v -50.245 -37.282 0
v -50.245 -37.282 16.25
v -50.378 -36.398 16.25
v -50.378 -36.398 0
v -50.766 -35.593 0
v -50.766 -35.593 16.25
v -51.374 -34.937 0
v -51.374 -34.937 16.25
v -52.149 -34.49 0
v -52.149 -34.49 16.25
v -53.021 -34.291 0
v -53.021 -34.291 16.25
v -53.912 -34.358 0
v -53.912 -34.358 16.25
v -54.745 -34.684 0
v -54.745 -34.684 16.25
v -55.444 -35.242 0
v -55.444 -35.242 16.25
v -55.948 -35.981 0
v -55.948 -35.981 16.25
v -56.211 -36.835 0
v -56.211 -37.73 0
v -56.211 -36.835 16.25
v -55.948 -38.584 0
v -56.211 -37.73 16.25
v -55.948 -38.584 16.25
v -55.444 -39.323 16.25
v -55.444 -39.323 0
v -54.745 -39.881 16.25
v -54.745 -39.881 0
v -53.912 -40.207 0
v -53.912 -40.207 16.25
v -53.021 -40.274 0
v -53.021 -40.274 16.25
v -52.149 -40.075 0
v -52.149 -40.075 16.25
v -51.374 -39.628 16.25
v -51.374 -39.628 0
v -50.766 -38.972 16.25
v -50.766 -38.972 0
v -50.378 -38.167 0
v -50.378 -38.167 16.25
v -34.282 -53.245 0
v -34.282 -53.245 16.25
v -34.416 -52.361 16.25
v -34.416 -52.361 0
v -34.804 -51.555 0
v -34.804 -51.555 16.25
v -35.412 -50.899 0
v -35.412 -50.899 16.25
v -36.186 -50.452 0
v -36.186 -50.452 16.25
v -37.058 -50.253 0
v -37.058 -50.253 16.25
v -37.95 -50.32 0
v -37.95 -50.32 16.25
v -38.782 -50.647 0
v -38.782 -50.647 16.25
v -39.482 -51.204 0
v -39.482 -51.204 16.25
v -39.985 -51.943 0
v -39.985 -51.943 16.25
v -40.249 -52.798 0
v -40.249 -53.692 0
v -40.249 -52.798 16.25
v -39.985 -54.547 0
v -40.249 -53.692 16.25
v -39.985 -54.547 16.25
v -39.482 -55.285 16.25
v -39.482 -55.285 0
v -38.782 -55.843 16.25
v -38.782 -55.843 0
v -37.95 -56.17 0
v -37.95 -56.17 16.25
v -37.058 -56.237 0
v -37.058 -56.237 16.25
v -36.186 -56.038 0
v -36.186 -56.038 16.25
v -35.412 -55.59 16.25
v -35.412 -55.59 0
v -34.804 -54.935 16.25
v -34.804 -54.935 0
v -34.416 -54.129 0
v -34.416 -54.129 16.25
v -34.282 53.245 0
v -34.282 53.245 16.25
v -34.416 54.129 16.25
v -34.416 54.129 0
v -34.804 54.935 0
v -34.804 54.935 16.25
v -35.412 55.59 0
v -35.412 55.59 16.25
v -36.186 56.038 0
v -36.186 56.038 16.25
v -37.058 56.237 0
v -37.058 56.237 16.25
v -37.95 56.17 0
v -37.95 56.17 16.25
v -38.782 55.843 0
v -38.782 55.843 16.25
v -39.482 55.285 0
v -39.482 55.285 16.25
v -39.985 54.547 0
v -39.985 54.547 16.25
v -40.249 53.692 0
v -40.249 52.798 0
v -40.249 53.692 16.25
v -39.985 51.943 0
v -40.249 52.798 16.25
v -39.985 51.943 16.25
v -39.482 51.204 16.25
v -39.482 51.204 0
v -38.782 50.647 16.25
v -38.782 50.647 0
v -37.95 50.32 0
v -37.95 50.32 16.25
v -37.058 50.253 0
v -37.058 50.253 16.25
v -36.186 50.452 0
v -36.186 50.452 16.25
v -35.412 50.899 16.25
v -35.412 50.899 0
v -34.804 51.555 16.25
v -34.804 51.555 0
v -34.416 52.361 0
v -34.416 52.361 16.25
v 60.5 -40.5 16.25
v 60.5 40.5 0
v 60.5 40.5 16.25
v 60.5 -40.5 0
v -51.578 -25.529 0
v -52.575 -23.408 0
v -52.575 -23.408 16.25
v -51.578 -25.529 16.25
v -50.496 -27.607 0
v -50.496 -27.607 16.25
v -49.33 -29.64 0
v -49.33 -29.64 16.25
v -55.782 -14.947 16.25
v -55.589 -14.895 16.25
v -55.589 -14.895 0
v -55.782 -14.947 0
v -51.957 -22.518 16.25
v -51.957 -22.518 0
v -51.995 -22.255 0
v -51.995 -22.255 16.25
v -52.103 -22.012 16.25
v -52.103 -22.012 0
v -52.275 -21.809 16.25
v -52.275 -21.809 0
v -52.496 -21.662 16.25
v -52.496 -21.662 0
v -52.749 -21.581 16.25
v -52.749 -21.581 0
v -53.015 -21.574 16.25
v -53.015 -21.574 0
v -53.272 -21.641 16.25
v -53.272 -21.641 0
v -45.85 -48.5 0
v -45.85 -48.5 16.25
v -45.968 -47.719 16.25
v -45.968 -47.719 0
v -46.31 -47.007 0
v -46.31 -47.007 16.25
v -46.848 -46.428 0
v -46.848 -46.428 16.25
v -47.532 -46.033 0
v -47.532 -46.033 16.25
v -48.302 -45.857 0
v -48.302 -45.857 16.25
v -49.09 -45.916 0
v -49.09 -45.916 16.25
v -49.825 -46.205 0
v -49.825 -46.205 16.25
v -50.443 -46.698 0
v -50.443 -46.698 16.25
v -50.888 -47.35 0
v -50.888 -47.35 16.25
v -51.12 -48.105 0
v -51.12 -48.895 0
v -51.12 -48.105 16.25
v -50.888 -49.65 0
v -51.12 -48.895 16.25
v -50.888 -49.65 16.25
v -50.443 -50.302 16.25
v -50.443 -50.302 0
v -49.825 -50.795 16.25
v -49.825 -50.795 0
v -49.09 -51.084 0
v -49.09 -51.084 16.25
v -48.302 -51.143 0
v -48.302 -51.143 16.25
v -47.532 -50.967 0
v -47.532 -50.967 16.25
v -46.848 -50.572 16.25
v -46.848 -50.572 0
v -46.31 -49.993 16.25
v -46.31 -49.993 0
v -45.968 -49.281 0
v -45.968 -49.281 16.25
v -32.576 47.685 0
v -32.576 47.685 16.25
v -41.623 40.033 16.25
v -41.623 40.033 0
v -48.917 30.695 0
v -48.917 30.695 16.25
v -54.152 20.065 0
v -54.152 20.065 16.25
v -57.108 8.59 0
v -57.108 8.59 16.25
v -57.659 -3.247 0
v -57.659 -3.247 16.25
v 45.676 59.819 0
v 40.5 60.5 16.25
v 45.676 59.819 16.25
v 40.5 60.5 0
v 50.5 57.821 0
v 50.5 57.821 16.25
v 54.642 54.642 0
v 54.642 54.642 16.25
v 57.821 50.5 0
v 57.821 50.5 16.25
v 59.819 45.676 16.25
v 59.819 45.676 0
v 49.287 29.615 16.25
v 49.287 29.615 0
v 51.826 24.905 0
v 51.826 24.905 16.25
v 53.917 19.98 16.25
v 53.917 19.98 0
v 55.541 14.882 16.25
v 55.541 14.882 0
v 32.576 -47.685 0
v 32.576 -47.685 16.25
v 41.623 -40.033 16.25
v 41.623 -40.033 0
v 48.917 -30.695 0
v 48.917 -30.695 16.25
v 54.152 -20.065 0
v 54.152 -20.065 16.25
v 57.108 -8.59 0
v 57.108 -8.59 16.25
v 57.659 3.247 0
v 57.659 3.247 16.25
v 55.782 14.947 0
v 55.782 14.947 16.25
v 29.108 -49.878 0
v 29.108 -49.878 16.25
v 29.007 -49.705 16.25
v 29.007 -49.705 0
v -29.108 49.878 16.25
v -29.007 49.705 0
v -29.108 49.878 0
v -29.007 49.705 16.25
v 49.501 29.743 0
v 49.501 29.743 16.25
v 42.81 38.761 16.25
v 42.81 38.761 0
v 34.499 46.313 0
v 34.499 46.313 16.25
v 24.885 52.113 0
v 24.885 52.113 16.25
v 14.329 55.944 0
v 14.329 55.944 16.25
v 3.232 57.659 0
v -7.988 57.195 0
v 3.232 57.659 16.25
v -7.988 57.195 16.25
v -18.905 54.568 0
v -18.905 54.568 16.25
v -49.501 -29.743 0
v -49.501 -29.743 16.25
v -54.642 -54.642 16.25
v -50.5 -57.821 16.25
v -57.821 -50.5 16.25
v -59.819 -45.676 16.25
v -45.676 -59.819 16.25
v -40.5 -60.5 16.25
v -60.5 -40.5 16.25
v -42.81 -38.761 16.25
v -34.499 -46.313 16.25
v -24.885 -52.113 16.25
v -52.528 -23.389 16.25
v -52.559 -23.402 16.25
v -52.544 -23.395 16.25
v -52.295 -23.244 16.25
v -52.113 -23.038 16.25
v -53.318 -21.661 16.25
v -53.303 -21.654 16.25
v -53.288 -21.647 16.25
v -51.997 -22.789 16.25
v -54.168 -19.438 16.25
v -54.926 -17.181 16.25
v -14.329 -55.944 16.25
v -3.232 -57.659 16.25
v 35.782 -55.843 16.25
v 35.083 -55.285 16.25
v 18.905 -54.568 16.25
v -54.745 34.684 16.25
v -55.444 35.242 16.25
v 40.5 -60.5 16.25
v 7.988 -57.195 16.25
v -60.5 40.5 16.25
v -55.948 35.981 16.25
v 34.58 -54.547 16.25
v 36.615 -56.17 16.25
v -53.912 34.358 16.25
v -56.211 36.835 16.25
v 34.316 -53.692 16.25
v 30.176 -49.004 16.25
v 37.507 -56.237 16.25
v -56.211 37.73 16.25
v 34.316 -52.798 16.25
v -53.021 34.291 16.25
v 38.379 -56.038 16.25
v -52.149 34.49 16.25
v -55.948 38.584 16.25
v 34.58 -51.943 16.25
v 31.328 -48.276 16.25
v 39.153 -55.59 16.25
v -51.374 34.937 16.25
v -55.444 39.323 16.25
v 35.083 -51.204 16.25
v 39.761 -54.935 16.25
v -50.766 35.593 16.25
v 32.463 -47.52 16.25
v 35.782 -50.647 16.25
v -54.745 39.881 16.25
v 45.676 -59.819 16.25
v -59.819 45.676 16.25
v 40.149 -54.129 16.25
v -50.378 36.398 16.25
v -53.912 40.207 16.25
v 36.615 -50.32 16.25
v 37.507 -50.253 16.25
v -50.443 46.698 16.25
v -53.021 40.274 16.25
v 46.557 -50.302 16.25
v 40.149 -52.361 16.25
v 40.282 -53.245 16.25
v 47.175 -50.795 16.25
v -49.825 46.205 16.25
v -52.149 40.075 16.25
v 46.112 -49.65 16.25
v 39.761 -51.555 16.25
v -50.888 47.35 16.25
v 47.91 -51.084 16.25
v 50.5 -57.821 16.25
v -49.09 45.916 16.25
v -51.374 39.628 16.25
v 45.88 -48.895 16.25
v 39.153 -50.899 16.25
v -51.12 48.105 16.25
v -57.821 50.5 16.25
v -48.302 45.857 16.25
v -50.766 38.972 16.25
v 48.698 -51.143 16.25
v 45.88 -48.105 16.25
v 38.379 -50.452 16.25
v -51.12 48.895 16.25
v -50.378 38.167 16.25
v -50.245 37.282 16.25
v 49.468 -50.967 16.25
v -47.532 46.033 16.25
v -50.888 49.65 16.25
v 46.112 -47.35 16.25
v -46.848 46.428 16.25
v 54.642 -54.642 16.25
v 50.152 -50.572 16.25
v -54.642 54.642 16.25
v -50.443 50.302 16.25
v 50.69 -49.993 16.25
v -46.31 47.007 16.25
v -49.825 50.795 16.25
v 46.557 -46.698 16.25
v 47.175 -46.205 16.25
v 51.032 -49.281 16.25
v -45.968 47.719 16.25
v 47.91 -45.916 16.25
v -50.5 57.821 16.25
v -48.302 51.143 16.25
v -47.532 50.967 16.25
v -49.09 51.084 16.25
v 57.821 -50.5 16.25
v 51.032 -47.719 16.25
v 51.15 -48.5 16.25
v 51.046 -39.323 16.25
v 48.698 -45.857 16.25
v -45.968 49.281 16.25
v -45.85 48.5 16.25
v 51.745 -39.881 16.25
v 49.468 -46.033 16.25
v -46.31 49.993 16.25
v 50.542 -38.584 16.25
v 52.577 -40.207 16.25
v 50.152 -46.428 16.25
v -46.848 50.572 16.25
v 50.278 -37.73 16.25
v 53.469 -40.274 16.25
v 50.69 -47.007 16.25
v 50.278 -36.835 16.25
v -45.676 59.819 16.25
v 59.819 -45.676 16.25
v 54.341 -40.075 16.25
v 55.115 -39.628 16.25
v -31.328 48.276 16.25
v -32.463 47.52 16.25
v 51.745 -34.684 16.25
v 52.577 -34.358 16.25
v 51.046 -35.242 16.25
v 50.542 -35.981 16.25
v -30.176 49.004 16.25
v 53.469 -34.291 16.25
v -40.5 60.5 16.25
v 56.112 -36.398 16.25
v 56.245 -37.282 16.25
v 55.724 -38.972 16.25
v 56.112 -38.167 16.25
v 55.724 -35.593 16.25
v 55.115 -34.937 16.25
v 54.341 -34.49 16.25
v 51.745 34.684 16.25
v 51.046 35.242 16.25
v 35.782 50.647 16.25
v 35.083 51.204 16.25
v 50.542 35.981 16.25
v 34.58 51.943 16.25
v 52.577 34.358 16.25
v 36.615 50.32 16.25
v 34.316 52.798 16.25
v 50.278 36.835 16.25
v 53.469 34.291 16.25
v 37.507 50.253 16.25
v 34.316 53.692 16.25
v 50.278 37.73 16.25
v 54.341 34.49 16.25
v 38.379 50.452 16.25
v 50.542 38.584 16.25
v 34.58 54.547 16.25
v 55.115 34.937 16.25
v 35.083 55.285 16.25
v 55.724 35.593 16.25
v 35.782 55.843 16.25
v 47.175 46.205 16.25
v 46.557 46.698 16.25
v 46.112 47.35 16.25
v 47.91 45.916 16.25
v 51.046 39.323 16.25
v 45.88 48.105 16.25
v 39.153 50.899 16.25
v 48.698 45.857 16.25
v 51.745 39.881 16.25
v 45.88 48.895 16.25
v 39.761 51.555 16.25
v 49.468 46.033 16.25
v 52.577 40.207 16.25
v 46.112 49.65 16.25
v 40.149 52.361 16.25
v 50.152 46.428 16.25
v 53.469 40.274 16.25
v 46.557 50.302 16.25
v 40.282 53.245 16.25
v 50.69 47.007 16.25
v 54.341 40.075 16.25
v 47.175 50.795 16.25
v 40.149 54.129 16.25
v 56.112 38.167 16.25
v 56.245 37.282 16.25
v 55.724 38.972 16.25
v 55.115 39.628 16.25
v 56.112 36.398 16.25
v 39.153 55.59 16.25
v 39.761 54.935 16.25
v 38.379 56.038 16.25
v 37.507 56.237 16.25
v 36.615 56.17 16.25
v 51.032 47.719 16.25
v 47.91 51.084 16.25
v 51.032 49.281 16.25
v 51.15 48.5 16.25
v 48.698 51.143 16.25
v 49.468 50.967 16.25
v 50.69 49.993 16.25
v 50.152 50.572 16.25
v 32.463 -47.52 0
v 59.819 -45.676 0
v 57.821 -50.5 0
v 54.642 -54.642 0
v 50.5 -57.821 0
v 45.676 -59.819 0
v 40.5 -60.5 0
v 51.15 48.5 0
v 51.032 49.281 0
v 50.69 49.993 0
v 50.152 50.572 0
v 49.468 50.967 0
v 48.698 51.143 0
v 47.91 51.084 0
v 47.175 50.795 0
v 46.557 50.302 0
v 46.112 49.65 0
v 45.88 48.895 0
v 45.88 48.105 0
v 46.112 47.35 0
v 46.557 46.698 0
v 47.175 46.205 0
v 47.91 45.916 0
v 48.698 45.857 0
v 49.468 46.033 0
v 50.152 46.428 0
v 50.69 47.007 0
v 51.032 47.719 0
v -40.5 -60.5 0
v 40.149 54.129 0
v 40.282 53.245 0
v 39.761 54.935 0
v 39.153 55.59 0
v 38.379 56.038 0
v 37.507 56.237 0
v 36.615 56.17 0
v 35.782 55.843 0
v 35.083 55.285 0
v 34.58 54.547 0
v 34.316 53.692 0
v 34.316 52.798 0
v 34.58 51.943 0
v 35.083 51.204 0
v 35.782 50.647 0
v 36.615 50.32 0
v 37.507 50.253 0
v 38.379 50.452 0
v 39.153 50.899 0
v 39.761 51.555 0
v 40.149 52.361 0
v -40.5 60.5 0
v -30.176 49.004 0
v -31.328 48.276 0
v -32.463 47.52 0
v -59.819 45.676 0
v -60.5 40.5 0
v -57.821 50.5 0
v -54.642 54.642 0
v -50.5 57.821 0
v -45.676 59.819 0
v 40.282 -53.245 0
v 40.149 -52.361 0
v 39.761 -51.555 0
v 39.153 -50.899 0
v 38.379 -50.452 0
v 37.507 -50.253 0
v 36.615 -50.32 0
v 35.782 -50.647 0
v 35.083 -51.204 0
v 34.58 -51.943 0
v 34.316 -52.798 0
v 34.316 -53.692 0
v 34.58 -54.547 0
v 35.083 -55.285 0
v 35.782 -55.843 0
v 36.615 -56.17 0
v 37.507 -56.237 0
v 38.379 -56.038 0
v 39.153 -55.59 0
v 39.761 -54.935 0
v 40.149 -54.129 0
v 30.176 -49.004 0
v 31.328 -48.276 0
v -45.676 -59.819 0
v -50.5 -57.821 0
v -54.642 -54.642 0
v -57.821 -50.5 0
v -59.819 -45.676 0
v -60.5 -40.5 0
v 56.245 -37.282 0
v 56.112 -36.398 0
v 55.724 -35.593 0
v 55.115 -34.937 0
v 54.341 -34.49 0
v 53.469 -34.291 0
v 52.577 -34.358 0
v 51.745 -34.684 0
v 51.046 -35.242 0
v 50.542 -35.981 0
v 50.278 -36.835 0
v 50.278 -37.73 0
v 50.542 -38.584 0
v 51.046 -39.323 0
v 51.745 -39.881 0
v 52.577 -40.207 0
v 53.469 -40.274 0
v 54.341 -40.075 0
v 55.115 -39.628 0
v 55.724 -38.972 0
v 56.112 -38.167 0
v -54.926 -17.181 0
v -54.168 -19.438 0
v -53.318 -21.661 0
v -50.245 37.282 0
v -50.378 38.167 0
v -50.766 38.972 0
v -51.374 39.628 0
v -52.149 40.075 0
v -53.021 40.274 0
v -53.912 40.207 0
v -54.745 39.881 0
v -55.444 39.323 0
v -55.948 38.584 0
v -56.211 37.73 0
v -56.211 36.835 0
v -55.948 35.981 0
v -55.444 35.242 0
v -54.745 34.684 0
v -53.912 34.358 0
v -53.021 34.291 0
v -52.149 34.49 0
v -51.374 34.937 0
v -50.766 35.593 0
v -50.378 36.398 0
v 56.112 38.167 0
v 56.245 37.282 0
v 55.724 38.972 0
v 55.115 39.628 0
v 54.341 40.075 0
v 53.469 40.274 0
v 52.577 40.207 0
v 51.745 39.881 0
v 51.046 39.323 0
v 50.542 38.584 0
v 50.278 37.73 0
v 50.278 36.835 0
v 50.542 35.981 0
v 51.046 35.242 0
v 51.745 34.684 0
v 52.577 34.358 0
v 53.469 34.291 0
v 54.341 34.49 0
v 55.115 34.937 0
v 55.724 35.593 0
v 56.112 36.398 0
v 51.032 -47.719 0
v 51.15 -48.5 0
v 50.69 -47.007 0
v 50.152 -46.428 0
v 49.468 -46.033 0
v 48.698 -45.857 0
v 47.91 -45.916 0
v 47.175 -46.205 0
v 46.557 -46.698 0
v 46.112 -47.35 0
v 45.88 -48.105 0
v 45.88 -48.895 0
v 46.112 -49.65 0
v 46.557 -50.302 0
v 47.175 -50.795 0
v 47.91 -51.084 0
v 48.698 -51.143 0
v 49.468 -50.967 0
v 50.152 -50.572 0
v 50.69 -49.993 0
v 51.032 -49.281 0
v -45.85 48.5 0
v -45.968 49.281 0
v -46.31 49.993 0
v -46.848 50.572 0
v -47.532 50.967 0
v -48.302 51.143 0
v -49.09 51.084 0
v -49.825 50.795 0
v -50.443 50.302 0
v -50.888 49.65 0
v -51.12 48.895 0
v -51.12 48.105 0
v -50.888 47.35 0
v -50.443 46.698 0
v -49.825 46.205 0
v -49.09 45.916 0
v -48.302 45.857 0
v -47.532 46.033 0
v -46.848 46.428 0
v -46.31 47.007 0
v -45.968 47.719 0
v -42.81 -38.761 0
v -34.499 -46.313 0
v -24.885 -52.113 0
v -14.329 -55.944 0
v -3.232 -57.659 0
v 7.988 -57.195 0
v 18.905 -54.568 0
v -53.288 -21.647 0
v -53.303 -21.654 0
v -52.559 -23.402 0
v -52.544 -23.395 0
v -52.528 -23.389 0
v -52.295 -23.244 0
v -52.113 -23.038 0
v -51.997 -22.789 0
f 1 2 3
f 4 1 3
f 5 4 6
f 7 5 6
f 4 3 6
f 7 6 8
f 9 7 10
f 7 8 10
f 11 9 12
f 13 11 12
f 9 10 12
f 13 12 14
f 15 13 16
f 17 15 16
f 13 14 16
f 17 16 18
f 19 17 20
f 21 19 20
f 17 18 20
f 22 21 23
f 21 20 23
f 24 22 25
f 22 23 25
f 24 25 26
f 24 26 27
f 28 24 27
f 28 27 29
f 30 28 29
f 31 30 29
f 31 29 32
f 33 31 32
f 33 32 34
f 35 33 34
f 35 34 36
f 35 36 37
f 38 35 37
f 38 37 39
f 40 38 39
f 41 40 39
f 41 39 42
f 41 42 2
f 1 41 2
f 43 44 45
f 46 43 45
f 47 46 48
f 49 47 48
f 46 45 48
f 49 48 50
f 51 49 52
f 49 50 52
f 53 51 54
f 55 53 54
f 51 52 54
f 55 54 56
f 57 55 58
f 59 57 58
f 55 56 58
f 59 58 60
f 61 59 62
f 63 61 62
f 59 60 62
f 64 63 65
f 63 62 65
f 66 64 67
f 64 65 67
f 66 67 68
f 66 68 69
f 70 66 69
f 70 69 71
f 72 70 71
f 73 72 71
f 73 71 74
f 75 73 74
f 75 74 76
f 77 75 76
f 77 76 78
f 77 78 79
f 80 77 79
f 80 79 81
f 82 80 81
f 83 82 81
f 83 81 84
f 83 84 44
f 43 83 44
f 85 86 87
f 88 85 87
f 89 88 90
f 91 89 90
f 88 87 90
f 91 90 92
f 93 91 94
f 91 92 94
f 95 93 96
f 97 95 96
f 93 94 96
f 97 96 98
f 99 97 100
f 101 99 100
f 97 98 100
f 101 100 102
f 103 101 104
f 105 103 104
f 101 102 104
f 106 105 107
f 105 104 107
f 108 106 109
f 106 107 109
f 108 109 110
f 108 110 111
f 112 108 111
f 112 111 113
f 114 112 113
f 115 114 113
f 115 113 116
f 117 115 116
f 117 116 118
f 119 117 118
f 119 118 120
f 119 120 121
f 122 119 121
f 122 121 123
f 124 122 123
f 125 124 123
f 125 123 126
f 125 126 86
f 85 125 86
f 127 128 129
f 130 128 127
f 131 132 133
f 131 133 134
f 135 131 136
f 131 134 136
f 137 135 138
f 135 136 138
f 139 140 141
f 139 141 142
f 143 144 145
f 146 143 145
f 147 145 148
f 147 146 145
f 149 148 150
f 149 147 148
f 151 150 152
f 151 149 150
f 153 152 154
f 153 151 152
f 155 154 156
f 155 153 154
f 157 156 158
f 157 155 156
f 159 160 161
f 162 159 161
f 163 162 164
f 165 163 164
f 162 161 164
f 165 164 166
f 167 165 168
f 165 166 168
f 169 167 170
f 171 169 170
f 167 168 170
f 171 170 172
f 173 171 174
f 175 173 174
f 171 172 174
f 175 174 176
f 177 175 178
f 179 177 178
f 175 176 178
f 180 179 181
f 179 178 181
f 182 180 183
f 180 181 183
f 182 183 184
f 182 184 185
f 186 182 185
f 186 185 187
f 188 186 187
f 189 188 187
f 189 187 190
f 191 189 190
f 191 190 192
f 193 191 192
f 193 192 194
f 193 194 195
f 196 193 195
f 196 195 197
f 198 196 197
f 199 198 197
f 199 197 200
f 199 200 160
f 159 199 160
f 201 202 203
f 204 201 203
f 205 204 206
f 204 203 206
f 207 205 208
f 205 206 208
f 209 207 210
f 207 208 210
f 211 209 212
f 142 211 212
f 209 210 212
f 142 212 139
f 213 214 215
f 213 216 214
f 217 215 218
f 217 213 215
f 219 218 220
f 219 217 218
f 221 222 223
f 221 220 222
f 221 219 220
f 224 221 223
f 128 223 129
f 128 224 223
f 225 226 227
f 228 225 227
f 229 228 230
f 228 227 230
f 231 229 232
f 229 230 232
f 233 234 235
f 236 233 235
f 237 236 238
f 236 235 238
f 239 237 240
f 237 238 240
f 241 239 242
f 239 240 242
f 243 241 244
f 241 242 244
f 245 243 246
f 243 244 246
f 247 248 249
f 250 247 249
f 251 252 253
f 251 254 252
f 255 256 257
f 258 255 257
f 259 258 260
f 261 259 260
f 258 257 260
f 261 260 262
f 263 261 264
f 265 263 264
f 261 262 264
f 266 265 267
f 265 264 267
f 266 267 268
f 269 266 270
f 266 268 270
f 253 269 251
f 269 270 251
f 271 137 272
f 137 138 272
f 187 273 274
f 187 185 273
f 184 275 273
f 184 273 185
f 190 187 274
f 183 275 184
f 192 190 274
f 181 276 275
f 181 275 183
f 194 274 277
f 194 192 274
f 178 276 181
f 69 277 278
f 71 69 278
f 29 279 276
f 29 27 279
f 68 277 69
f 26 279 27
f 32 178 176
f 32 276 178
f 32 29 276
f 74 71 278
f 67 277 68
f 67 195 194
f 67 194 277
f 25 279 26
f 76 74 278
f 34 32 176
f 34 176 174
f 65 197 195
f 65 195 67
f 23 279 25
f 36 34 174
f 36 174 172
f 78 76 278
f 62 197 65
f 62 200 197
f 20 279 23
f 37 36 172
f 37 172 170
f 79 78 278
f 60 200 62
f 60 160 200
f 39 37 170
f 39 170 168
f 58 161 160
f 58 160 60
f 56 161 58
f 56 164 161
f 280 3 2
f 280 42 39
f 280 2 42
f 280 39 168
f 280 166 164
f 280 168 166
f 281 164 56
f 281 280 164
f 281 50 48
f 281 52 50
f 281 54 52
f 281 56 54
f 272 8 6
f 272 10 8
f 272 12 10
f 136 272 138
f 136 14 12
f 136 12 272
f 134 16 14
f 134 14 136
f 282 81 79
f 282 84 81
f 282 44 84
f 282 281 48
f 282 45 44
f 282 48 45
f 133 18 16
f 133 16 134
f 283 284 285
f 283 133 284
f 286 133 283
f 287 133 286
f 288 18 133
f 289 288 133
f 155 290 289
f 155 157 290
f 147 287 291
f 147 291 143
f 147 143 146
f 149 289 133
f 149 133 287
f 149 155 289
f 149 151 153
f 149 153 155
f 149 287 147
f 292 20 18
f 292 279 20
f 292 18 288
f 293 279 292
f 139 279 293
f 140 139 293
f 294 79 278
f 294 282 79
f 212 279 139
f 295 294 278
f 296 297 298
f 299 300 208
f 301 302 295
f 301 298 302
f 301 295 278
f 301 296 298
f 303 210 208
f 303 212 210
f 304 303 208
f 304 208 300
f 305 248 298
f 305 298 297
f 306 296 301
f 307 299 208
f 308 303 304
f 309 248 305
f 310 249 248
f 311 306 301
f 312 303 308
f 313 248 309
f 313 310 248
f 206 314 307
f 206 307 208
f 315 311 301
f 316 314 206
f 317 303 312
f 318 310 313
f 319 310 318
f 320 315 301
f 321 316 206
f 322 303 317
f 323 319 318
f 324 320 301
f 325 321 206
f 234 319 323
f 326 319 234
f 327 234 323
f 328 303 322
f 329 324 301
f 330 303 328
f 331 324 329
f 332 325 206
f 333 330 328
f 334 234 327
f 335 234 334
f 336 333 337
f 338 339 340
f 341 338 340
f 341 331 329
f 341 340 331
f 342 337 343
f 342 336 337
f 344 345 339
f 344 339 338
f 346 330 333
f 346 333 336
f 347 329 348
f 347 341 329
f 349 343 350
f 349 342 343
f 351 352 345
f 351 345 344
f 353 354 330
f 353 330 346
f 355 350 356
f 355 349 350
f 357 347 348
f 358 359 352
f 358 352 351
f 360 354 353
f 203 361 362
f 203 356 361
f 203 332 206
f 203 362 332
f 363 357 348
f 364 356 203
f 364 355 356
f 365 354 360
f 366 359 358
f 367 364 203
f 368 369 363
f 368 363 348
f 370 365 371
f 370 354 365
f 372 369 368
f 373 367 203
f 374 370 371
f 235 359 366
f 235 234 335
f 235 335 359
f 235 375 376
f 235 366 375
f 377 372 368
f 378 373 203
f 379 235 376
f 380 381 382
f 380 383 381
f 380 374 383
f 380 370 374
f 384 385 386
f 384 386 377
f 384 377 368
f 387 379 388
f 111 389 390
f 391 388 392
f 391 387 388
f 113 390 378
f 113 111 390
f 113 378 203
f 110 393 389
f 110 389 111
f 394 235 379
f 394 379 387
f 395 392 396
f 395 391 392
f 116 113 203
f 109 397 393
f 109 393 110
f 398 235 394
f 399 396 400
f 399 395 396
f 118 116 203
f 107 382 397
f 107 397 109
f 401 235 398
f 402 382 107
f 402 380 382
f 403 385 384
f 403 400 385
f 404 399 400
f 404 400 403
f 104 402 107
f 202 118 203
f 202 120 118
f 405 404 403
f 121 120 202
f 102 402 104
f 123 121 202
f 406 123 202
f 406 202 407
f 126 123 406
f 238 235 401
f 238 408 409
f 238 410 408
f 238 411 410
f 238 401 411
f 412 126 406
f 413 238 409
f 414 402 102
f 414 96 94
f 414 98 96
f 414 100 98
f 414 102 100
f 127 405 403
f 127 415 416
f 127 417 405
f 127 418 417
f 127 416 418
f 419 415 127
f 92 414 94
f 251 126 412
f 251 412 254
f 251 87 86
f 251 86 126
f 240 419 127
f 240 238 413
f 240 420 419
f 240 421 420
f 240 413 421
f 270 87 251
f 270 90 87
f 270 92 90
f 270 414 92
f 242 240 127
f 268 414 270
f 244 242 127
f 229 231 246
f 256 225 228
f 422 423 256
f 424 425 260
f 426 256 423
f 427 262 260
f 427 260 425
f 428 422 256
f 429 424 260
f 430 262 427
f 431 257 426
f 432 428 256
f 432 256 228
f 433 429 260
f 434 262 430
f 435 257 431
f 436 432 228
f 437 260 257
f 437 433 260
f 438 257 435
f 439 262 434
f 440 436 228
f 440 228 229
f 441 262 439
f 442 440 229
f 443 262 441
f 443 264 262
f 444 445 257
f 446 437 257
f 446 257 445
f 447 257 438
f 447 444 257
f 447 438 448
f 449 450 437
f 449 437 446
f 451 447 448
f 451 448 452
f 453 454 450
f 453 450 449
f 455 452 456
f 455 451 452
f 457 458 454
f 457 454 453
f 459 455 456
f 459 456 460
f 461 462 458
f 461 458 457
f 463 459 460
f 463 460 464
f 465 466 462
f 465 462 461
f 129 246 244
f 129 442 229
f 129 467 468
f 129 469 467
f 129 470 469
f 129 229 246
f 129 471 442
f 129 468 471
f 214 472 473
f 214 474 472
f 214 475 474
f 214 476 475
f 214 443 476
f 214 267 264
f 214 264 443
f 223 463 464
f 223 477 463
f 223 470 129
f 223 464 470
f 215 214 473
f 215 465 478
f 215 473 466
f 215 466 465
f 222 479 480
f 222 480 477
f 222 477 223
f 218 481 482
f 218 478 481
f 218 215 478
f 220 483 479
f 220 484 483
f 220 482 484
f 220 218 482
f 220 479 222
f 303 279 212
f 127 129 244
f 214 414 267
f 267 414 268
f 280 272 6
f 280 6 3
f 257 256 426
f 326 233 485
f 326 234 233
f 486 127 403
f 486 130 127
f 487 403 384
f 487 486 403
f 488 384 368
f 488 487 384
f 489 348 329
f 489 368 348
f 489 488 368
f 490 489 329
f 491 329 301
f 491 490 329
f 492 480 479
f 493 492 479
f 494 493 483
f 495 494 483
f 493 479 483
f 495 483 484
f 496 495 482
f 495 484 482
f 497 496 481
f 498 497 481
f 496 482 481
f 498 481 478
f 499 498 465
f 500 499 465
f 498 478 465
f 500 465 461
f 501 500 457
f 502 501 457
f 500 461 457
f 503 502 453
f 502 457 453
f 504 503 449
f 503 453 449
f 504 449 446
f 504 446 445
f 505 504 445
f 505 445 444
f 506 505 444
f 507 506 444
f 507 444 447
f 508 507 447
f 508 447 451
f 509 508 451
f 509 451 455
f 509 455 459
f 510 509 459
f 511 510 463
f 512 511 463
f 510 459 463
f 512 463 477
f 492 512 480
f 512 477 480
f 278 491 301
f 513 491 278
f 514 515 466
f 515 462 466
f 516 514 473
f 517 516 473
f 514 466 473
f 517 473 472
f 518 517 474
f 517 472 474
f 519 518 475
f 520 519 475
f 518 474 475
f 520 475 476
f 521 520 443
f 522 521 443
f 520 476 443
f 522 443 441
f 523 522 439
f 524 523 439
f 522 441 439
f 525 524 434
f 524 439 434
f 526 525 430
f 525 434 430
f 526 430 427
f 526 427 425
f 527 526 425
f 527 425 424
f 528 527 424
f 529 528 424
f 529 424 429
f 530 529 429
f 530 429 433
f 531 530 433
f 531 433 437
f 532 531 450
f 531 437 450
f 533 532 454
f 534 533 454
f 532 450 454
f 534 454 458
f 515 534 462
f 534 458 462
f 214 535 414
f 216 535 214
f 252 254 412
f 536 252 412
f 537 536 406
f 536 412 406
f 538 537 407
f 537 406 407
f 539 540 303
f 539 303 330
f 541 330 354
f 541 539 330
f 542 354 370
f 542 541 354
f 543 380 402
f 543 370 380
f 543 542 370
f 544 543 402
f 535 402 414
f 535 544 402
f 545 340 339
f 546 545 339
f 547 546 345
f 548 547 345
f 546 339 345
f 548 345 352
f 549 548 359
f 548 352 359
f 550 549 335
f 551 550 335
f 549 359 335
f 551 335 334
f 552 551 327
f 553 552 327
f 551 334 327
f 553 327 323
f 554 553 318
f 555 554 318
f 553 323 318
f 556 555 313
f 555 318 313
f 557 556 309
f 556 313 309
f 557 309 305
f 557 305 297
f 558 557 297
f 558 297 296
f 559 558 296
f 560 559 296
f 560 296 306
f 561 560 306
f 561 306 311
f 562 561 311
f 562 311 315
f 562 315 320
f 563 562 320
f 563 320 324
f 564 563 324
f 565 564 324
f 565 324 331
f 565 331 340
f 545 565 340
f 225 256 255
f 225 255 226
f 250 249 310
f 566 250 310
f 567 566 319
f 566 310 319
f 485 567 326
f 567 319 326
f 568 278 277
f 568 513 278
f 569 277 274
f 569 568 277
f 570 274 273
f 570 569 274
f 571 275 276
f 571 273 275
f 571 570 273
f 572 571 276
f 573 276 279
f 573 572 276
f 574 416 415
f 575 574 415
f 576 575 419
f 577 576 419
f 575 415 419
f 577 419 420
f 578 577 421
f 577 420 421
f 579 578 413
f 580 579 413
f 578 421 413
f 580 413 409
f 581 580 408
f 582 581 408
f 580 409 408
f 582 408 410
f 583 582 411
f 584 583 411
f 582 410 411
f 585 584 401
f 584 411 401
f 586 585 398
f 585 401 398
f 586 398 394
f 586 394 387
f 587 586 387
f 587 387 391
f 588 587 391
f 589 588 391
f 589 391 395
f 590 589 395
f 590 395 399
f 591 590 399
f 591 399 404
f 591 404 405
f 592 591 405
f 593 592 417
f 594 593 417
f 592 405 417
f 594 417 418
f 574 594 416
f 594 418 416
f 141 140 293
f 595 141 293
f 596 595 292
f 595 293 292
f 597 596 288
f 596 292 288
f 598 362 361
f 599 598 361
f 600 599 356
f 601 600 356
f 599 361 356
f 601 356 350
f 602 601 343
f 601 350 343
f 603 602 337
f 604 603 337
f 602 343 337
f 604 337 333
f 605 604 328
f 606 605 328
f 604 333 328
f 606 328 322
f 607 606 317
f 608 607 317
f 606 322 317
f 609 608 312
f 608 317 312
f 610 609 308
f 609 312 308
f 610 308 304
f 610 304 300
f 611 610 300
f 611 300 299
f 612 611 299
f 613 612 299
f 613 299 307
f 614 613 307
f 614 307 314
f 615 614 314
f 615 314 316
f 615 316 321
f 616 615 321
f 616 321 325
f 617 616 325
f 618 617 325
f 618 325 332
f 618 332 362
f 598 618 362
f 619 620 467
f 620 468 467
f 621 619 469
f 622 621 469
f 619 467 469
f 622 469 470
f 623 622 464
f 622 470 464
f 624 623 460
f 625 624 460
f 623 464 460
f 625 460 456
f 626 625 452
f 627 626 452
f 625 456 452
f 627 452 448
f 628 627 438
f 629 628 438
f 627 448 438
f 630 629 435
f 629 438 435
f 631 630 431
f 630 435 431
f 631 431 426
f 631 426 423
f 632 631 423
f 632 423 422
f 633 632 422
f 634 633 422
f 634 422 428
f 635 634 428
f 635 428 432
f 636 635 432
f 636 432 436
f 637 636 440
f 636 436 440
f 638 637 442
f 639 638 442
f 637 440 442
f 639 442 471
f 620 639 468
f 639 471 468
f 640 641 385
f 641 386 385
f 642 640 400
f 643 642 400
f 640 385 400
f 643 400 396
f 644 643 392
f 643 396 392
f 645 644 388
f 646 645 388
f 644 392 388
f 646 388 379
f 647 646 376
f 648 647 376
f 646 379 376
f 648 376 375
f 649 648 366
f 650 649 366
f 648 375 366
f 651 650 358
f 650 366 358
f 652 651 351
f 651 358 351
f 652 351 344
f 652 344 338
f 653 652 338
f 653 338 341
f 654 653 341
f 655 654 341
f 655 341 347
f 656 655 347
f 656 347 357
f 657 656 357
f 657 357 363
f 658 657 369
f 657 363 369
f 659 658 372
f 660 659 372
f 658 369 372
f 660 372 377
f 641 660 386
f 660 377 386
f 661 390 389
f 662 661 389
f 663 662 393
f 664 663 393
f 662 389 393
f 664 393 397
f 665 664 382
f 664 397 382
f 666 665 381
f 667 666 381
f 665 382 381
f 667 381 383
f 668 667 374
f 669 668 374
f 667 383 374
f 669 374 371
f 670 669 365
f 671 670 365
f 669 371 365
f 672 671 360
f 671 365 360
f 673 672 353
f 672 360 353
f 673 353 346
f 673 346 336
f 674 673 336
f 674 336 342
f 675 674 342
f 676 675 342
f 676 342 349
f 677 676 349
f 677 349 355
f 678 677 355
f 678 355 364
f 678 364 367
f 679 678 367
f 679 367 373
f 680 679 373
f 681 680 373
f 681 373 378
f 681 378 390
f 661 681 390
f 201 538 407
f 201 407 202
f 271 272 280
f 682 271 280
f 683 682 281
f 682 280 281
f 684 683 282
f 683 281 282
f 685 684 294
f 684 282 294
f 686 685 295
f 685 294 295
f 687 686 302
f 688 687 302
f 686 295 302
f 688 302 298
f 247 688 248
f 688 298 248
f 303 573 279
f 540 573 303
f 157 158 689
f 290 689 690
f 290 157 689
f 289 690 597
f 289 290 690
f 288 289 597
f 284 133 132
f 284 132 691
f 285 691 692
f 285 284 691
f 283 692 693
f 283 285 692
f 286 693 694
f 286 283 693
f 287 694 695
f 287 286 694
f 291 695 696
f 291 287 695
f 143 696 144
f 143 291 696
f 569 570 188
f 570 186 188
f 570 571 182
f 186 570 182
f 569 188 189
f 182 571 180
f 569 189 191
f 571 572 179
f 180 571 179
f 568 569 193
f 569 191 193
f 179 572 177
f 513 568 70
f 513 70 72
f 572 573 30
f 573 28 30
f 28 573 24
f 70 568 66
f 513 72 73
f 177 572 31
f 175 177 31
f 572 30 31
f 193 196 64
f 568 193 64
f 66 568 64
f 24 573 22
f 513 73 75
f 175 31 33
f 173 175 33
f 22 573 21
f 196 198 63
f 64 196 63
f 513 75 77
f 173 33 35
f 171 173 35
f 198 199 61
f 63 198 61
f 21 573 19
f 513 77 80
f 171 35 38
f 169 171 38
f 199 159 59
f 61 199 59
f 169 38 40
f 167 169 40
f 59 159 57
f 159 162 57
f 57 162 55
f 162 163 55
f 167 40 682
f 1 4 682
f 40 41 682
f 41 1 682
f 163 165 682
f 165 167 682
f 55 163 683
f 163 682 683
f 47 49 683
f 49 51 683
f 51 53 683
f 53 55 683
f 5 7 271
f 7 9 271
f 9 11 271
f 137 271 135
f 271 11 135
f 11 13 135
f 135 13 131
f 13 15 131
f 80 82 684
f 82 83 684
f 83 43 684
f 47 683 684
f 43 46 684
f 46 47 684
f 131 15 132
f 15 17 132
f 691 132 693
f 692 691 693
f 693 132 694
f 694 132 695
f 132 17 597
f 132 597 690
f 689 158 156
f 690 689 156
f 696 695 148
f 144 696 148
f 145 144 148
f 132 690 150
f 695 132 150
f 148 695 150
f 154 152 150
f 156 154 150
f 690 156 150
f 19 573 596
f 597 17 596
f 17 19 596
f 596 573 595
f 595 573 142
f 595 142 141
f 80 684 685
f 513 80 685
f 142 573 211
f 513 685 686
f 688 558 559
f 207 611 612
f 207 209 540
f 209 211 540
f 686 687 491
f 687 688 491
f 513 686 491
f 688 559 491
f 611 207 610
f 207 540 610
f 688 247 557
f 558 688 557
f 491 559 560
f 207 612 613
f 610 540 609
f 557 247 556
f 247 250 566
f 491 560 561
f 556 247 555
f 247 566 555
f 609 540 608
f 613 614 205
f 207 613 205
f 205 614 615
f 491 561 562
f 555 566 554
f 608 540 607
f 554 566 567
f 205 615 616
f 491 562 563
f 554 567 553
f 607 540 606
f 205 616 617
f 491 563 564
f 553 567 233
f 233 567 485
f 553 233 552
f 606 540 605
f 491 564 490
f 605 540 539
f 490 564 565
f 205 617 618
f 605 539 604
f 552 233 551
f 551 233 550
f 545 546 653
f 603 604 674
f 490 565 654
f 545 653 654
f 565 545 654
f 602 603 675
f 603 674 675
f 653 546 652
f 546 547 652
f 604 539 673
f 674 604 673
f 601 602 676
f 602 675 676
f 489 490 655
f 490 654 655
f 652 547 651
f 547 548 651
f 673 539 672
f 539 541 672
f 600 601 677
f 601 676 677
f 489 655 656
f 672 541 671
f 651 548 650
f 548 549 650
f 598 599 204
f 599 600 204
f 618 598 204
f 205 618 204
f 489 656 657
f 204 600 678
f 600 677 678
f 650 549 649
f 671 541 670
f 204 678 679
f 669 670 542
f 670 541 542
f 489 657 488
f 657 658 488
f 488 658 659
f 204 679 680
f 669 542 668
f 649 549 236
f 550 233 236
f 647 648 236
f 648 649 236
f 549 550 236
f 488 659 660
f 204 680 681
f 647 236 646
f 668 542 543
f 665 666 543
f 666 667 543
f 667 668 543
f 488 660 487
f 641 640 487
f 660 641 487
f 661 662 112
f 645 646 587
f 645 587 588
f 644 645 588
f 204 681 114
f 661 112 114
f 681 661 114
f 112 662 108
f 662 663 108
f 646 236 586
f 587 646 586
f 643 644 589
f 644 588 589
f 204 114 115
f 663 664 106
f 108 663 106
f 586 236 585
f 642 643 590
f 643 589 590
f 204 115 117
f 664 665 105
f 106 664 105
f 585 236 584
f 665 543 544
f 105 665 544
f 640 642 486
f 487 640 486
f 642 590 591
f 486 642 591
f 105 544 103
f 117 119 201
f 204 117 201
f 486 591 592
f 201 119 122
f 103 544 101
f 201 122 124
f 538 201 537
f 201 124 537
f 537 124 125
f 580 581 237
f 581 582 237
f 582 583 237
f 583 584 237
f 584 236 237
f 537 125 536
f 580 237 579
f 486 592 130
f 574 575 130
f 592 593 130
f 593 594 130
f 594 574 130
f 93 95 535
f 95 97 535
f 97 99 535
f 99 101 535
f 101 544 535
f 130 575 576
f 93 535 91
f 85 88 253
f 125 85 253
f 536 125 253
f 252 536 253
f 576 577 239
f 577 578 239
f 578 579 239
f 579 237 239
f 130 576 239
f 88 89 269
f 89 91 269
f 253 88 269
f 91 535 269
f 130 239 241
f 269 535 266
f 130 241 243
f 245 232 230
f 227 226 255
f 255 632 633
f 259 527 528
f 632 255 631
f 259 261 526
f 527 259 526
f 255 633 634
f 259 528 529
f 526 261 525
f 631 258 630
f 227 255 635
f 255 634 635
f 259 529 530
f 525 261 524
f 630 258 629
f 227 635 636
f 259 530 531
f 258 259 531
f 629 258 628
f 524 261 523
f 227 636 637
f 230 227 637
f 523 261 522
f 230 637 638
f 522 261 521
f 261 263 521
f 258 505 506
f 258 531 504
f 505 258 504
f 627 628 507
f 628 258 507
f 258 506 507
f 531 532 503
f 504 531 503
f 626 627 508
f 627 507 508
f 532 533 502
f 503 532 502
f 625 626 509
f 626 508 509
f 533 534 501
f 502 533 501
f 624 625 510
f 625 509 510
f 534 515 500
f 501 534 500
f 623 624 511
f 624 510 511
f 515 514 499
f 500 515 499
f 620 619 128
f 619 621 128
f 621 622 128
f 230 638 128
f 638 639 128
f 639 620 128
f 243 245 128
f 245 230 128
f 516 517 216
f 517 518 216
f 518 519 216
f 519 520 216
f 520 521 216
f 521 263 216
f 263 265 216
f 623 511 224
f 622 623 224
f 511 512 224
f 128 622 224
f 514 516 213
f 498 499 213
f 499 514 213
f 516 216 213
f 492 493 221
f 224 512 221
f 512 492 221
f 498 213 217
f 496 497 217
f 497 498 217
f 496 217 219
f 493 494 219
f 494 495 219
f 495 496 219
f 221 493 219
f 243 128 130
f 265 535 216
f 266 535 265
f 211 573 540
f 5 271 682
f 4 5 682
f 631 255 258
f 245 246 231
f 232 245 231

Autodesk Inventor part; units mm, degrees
ref_plane "YZ Plane" through (0, 0, 0) normal (1, 0, 0) x (0, 1, 0)
ref_plane "XZ Plane" through (0, 0, 0) normal (0, 1, 0) x (-1, 0, 0)
ref_plane "XY Plane" through (0, 0, 0) normal (0, 0, 1) x (1, 0, 0)
sketch "Sketch1" plane through (0, 0, 0) normal (0, 0, 1) x (1, 0, 0)
  circle A0 centre (0, 0) radius 57.5
  circle A1 centre (0, 0) radius 60.5
  line L0 (-40.5, 60.5) -> (40.5, 60.5)
  line L1 (60.5, 40.5) -> (60.5, -40.5)
  line L2 (40.5, -60.5) -> (-40.5, -60.5)
  line L3 (-60.5, -40.5) -> (-60.5, 40.5)
  arc A2 (-40.5, 60.5) -> (-60.5, 40.5) centre (-40.5, 40.5) ccw
  arc A3 (60.5, 40.5) -> (40.5, 60.5) centre (40.5, 40.5) ccw
  arc A4 (40.5, -60.5) -> (60.5, -40.5) centre (40.5, -40.5) ccw
  arc A5 (-60.5, -40.5) -> (-40.5, -60.5) centre (-40.5, -40.5) ccw
  dimension "d0" = 115
  dimension "d1" = 121
  dimension "d2" = 20
extrude "Extrusion1" add sketch "Sketch1" along normal blind 16.25
sketch "Sketch3" plane through (0, 0, 16.25) normal (0, 0, 1) x (1, 0, 0)
  circle A0 centre (-48.5, -48.5) radius 2.65 projected
  circle A1 centre (-53.2449, -37.2825) radius 2.15 projected
  circle A2 centre (-37.2825, -53.2449) radius 2.15 projected
  circle A3 centre (37.2825, -53.2449) radius 2.15 projected
  circle A4 centre (48.5, -48.5) radius 2.65 projected
  circle A5 centre (53.2449, -37.2825) radius 2.15 projected
  circle A6 centre (53.2449, 37.2825) radius 2.15 projected
  circle A7 centre (48.5, 48.5) radius 2.65 projected
  circle A8 centre (37.2825, 53.2449) radius 2.15 projected
  circle A9 centre (-37.2825, 53.2449) radius 2.15 projected
  circle A10 centre (-48.5, 48.5) radius 2.65 projected
  circle A11 centre (-53.2449, 37.2825) radius 2.15 projected
  point P0 (0, 0)
extrude "Extrusion3" cut sketch "Sketch3" against normal through all
sketch "Sketch4" plane through (0, 0, 16.25) normal (0, 0, 1) x (1, 0, 0)
  circle A0 centre (-37.2825, -53.2449) radius 2.15 projected
  circle A1 centre (-37.2825, -53.2449) radius 3
  circle A2 centre (-53.2449, -37.2825) radius 2.15 projected
  circle A3 centre (-53.2449, -37.2825) radius 3
  circle A4 centre (-53.2449, 37.2825) radius 2.15 projected
  circle A5 centre (-53.2449, 37.2825) radius 3
  circle A6 centre (-37.2825, 53.2449) radius 2.15 projected
  circle A7 centre (-37.2825, 53.2449) radius 3
  circle A8 centre (37.2825, 53.2449) radius 2.15 projected
  circle A9 centre (37.2825, 53.2449) radius 3
  circle A10 centre (53.2449, 37.2825) radius 2.15 projected
  circle A11 centre (53.2449, 37.2825) radius 3
  circle A12 centre (53.2449, -37.2825) radius 2.15 projected
  circle A13 centre (53.2449, -37.2825) radius 3
  circle A14 centre (37.2825, -53.2449) radius 2.15 projected
  circle A15 centre (37.2825, -53.2449) radius 3
  point P0 (0, 0)
  point P1 (48.5, -48.5)
  dimension "d28" = 6
  dimension "d29" = 6
  dimension "d30" = 6
  dimension "d31" = 6
  dimension "d32" = 6
  dimension "d33" = 6
  dimension "d34" = 6
  dimension "d36" = 6
extrude "Extrusion4" cut sketch "Sketch4" against normal through all contours A0 | A1 | A2 | A3 | A4 | A5 | A6 | A7 | A8 | A9 | A10 | A11 | A12 | A13 | A14 | A15
sketch "Sketch5" plane through (0, 0, 16.25) normal (0, 0, 1) x (1, 0, 0)
  arc A0 (-51.9873, -22.1262) -> (-53.291, -21.5943) centre (-52.9074, -22.5178) ccw
  arc A1 (-52.5078, -23.4345) -> (-51.9873, -22.1262) centre (-52.9074, -22.5178) ccw
  circle A2 centre (0, 0) radius 57.55
  circle A3 centre (-52.9074, -22.5178) radius 0.95
  circle A4 centre (0, 0) radius 57.75
  line L0 (55.7822, 14.9468) -> (-70.3053, -18.8382)
  line L1 (40.5, 60.5) -> (-40.5, 60.5) projected
  line L2 (49.5014, 29.7434) -> (-78.6926, -47.2833)
  line L3 (32.5757, -47.6853) -> (-33.549, 49.11)
  line L4 (29.1077, -49.8779) -> (-30.5513, 52.3515)
  point P0 (-55.7822, -14.9468)
  point P1 (-55.589, -14.895)
  point P2 (-53.3179, -21.6611)
  point P3 (-52.5746, -23.4076)
  point P4 (-49.33, -29.6404)
  point P5 (-49.5014, -29.7434)
  point P6 (29.0069, -49.7051)
  point P7 (32.4629, -47.5201)
  point P8 (-29.1077, 49.8779)
  point P9 (-29.0069, 49.7051)
  point P10 (-32.4629, 47.5201)
  point P11 (-32.5757, 47.6853)
  dimension "d39" = 115.1
  dimension "d40" = 115.5
  dimension "d41" = 15
  dimension "d42" = 16
extrude "Extrusion5" cut sketch "Sketch5" against normal through all contours A2 L3 L0 | A2 L0 A4 L3 | A2 L4 L3 | L2 L4 A2 | A2 L4 A4 L2 | L2 A2 A3 L0 | L4 A2 L2 | L0 A2 L3 | L3 A2 L4 | L4 A4 L2 A2 | L0 A4 L3 A2
sketch "Sketch6" plane through (0, 0, 16.25) normal (0, 0, 1) x (1, 0, 0)
  arc A0 (-52.5078, -23.4345) -> (-51.9873, -22.1262) centre (-52.9074, -22.5178) ccw
  arc A1 (-51.9873, -22.1262) -> (-53.291, -21.5943) centre (-52.9074, -22.5178) ccw
  arc A2 (-53.2722, -21.6407) -> (-52.5282, -23.3888) centre (0, 0) ccw projected
  circle A3 centre (-52.9074, -22.5178) radius 0.95
  point P0 (-52.5282, -23.3888)
extrude "Extrusion6" add sketch "Sketch6" against normal up to surface (16.25 mm away) contours A3 A2 picked at (-52.6277, -22.3682)
equation "\"d28\" = d31"
equation "\"d29\" = d31"
equation "\"d30\" = d31"
equation "\"d32\" = d31"
equation "\"d33\" = d31"
equation "\"d34\" = d31"
equation "\"d36\" = d31"
properties part number "stator_center_00_p" material "PC/ABS Plastic"
